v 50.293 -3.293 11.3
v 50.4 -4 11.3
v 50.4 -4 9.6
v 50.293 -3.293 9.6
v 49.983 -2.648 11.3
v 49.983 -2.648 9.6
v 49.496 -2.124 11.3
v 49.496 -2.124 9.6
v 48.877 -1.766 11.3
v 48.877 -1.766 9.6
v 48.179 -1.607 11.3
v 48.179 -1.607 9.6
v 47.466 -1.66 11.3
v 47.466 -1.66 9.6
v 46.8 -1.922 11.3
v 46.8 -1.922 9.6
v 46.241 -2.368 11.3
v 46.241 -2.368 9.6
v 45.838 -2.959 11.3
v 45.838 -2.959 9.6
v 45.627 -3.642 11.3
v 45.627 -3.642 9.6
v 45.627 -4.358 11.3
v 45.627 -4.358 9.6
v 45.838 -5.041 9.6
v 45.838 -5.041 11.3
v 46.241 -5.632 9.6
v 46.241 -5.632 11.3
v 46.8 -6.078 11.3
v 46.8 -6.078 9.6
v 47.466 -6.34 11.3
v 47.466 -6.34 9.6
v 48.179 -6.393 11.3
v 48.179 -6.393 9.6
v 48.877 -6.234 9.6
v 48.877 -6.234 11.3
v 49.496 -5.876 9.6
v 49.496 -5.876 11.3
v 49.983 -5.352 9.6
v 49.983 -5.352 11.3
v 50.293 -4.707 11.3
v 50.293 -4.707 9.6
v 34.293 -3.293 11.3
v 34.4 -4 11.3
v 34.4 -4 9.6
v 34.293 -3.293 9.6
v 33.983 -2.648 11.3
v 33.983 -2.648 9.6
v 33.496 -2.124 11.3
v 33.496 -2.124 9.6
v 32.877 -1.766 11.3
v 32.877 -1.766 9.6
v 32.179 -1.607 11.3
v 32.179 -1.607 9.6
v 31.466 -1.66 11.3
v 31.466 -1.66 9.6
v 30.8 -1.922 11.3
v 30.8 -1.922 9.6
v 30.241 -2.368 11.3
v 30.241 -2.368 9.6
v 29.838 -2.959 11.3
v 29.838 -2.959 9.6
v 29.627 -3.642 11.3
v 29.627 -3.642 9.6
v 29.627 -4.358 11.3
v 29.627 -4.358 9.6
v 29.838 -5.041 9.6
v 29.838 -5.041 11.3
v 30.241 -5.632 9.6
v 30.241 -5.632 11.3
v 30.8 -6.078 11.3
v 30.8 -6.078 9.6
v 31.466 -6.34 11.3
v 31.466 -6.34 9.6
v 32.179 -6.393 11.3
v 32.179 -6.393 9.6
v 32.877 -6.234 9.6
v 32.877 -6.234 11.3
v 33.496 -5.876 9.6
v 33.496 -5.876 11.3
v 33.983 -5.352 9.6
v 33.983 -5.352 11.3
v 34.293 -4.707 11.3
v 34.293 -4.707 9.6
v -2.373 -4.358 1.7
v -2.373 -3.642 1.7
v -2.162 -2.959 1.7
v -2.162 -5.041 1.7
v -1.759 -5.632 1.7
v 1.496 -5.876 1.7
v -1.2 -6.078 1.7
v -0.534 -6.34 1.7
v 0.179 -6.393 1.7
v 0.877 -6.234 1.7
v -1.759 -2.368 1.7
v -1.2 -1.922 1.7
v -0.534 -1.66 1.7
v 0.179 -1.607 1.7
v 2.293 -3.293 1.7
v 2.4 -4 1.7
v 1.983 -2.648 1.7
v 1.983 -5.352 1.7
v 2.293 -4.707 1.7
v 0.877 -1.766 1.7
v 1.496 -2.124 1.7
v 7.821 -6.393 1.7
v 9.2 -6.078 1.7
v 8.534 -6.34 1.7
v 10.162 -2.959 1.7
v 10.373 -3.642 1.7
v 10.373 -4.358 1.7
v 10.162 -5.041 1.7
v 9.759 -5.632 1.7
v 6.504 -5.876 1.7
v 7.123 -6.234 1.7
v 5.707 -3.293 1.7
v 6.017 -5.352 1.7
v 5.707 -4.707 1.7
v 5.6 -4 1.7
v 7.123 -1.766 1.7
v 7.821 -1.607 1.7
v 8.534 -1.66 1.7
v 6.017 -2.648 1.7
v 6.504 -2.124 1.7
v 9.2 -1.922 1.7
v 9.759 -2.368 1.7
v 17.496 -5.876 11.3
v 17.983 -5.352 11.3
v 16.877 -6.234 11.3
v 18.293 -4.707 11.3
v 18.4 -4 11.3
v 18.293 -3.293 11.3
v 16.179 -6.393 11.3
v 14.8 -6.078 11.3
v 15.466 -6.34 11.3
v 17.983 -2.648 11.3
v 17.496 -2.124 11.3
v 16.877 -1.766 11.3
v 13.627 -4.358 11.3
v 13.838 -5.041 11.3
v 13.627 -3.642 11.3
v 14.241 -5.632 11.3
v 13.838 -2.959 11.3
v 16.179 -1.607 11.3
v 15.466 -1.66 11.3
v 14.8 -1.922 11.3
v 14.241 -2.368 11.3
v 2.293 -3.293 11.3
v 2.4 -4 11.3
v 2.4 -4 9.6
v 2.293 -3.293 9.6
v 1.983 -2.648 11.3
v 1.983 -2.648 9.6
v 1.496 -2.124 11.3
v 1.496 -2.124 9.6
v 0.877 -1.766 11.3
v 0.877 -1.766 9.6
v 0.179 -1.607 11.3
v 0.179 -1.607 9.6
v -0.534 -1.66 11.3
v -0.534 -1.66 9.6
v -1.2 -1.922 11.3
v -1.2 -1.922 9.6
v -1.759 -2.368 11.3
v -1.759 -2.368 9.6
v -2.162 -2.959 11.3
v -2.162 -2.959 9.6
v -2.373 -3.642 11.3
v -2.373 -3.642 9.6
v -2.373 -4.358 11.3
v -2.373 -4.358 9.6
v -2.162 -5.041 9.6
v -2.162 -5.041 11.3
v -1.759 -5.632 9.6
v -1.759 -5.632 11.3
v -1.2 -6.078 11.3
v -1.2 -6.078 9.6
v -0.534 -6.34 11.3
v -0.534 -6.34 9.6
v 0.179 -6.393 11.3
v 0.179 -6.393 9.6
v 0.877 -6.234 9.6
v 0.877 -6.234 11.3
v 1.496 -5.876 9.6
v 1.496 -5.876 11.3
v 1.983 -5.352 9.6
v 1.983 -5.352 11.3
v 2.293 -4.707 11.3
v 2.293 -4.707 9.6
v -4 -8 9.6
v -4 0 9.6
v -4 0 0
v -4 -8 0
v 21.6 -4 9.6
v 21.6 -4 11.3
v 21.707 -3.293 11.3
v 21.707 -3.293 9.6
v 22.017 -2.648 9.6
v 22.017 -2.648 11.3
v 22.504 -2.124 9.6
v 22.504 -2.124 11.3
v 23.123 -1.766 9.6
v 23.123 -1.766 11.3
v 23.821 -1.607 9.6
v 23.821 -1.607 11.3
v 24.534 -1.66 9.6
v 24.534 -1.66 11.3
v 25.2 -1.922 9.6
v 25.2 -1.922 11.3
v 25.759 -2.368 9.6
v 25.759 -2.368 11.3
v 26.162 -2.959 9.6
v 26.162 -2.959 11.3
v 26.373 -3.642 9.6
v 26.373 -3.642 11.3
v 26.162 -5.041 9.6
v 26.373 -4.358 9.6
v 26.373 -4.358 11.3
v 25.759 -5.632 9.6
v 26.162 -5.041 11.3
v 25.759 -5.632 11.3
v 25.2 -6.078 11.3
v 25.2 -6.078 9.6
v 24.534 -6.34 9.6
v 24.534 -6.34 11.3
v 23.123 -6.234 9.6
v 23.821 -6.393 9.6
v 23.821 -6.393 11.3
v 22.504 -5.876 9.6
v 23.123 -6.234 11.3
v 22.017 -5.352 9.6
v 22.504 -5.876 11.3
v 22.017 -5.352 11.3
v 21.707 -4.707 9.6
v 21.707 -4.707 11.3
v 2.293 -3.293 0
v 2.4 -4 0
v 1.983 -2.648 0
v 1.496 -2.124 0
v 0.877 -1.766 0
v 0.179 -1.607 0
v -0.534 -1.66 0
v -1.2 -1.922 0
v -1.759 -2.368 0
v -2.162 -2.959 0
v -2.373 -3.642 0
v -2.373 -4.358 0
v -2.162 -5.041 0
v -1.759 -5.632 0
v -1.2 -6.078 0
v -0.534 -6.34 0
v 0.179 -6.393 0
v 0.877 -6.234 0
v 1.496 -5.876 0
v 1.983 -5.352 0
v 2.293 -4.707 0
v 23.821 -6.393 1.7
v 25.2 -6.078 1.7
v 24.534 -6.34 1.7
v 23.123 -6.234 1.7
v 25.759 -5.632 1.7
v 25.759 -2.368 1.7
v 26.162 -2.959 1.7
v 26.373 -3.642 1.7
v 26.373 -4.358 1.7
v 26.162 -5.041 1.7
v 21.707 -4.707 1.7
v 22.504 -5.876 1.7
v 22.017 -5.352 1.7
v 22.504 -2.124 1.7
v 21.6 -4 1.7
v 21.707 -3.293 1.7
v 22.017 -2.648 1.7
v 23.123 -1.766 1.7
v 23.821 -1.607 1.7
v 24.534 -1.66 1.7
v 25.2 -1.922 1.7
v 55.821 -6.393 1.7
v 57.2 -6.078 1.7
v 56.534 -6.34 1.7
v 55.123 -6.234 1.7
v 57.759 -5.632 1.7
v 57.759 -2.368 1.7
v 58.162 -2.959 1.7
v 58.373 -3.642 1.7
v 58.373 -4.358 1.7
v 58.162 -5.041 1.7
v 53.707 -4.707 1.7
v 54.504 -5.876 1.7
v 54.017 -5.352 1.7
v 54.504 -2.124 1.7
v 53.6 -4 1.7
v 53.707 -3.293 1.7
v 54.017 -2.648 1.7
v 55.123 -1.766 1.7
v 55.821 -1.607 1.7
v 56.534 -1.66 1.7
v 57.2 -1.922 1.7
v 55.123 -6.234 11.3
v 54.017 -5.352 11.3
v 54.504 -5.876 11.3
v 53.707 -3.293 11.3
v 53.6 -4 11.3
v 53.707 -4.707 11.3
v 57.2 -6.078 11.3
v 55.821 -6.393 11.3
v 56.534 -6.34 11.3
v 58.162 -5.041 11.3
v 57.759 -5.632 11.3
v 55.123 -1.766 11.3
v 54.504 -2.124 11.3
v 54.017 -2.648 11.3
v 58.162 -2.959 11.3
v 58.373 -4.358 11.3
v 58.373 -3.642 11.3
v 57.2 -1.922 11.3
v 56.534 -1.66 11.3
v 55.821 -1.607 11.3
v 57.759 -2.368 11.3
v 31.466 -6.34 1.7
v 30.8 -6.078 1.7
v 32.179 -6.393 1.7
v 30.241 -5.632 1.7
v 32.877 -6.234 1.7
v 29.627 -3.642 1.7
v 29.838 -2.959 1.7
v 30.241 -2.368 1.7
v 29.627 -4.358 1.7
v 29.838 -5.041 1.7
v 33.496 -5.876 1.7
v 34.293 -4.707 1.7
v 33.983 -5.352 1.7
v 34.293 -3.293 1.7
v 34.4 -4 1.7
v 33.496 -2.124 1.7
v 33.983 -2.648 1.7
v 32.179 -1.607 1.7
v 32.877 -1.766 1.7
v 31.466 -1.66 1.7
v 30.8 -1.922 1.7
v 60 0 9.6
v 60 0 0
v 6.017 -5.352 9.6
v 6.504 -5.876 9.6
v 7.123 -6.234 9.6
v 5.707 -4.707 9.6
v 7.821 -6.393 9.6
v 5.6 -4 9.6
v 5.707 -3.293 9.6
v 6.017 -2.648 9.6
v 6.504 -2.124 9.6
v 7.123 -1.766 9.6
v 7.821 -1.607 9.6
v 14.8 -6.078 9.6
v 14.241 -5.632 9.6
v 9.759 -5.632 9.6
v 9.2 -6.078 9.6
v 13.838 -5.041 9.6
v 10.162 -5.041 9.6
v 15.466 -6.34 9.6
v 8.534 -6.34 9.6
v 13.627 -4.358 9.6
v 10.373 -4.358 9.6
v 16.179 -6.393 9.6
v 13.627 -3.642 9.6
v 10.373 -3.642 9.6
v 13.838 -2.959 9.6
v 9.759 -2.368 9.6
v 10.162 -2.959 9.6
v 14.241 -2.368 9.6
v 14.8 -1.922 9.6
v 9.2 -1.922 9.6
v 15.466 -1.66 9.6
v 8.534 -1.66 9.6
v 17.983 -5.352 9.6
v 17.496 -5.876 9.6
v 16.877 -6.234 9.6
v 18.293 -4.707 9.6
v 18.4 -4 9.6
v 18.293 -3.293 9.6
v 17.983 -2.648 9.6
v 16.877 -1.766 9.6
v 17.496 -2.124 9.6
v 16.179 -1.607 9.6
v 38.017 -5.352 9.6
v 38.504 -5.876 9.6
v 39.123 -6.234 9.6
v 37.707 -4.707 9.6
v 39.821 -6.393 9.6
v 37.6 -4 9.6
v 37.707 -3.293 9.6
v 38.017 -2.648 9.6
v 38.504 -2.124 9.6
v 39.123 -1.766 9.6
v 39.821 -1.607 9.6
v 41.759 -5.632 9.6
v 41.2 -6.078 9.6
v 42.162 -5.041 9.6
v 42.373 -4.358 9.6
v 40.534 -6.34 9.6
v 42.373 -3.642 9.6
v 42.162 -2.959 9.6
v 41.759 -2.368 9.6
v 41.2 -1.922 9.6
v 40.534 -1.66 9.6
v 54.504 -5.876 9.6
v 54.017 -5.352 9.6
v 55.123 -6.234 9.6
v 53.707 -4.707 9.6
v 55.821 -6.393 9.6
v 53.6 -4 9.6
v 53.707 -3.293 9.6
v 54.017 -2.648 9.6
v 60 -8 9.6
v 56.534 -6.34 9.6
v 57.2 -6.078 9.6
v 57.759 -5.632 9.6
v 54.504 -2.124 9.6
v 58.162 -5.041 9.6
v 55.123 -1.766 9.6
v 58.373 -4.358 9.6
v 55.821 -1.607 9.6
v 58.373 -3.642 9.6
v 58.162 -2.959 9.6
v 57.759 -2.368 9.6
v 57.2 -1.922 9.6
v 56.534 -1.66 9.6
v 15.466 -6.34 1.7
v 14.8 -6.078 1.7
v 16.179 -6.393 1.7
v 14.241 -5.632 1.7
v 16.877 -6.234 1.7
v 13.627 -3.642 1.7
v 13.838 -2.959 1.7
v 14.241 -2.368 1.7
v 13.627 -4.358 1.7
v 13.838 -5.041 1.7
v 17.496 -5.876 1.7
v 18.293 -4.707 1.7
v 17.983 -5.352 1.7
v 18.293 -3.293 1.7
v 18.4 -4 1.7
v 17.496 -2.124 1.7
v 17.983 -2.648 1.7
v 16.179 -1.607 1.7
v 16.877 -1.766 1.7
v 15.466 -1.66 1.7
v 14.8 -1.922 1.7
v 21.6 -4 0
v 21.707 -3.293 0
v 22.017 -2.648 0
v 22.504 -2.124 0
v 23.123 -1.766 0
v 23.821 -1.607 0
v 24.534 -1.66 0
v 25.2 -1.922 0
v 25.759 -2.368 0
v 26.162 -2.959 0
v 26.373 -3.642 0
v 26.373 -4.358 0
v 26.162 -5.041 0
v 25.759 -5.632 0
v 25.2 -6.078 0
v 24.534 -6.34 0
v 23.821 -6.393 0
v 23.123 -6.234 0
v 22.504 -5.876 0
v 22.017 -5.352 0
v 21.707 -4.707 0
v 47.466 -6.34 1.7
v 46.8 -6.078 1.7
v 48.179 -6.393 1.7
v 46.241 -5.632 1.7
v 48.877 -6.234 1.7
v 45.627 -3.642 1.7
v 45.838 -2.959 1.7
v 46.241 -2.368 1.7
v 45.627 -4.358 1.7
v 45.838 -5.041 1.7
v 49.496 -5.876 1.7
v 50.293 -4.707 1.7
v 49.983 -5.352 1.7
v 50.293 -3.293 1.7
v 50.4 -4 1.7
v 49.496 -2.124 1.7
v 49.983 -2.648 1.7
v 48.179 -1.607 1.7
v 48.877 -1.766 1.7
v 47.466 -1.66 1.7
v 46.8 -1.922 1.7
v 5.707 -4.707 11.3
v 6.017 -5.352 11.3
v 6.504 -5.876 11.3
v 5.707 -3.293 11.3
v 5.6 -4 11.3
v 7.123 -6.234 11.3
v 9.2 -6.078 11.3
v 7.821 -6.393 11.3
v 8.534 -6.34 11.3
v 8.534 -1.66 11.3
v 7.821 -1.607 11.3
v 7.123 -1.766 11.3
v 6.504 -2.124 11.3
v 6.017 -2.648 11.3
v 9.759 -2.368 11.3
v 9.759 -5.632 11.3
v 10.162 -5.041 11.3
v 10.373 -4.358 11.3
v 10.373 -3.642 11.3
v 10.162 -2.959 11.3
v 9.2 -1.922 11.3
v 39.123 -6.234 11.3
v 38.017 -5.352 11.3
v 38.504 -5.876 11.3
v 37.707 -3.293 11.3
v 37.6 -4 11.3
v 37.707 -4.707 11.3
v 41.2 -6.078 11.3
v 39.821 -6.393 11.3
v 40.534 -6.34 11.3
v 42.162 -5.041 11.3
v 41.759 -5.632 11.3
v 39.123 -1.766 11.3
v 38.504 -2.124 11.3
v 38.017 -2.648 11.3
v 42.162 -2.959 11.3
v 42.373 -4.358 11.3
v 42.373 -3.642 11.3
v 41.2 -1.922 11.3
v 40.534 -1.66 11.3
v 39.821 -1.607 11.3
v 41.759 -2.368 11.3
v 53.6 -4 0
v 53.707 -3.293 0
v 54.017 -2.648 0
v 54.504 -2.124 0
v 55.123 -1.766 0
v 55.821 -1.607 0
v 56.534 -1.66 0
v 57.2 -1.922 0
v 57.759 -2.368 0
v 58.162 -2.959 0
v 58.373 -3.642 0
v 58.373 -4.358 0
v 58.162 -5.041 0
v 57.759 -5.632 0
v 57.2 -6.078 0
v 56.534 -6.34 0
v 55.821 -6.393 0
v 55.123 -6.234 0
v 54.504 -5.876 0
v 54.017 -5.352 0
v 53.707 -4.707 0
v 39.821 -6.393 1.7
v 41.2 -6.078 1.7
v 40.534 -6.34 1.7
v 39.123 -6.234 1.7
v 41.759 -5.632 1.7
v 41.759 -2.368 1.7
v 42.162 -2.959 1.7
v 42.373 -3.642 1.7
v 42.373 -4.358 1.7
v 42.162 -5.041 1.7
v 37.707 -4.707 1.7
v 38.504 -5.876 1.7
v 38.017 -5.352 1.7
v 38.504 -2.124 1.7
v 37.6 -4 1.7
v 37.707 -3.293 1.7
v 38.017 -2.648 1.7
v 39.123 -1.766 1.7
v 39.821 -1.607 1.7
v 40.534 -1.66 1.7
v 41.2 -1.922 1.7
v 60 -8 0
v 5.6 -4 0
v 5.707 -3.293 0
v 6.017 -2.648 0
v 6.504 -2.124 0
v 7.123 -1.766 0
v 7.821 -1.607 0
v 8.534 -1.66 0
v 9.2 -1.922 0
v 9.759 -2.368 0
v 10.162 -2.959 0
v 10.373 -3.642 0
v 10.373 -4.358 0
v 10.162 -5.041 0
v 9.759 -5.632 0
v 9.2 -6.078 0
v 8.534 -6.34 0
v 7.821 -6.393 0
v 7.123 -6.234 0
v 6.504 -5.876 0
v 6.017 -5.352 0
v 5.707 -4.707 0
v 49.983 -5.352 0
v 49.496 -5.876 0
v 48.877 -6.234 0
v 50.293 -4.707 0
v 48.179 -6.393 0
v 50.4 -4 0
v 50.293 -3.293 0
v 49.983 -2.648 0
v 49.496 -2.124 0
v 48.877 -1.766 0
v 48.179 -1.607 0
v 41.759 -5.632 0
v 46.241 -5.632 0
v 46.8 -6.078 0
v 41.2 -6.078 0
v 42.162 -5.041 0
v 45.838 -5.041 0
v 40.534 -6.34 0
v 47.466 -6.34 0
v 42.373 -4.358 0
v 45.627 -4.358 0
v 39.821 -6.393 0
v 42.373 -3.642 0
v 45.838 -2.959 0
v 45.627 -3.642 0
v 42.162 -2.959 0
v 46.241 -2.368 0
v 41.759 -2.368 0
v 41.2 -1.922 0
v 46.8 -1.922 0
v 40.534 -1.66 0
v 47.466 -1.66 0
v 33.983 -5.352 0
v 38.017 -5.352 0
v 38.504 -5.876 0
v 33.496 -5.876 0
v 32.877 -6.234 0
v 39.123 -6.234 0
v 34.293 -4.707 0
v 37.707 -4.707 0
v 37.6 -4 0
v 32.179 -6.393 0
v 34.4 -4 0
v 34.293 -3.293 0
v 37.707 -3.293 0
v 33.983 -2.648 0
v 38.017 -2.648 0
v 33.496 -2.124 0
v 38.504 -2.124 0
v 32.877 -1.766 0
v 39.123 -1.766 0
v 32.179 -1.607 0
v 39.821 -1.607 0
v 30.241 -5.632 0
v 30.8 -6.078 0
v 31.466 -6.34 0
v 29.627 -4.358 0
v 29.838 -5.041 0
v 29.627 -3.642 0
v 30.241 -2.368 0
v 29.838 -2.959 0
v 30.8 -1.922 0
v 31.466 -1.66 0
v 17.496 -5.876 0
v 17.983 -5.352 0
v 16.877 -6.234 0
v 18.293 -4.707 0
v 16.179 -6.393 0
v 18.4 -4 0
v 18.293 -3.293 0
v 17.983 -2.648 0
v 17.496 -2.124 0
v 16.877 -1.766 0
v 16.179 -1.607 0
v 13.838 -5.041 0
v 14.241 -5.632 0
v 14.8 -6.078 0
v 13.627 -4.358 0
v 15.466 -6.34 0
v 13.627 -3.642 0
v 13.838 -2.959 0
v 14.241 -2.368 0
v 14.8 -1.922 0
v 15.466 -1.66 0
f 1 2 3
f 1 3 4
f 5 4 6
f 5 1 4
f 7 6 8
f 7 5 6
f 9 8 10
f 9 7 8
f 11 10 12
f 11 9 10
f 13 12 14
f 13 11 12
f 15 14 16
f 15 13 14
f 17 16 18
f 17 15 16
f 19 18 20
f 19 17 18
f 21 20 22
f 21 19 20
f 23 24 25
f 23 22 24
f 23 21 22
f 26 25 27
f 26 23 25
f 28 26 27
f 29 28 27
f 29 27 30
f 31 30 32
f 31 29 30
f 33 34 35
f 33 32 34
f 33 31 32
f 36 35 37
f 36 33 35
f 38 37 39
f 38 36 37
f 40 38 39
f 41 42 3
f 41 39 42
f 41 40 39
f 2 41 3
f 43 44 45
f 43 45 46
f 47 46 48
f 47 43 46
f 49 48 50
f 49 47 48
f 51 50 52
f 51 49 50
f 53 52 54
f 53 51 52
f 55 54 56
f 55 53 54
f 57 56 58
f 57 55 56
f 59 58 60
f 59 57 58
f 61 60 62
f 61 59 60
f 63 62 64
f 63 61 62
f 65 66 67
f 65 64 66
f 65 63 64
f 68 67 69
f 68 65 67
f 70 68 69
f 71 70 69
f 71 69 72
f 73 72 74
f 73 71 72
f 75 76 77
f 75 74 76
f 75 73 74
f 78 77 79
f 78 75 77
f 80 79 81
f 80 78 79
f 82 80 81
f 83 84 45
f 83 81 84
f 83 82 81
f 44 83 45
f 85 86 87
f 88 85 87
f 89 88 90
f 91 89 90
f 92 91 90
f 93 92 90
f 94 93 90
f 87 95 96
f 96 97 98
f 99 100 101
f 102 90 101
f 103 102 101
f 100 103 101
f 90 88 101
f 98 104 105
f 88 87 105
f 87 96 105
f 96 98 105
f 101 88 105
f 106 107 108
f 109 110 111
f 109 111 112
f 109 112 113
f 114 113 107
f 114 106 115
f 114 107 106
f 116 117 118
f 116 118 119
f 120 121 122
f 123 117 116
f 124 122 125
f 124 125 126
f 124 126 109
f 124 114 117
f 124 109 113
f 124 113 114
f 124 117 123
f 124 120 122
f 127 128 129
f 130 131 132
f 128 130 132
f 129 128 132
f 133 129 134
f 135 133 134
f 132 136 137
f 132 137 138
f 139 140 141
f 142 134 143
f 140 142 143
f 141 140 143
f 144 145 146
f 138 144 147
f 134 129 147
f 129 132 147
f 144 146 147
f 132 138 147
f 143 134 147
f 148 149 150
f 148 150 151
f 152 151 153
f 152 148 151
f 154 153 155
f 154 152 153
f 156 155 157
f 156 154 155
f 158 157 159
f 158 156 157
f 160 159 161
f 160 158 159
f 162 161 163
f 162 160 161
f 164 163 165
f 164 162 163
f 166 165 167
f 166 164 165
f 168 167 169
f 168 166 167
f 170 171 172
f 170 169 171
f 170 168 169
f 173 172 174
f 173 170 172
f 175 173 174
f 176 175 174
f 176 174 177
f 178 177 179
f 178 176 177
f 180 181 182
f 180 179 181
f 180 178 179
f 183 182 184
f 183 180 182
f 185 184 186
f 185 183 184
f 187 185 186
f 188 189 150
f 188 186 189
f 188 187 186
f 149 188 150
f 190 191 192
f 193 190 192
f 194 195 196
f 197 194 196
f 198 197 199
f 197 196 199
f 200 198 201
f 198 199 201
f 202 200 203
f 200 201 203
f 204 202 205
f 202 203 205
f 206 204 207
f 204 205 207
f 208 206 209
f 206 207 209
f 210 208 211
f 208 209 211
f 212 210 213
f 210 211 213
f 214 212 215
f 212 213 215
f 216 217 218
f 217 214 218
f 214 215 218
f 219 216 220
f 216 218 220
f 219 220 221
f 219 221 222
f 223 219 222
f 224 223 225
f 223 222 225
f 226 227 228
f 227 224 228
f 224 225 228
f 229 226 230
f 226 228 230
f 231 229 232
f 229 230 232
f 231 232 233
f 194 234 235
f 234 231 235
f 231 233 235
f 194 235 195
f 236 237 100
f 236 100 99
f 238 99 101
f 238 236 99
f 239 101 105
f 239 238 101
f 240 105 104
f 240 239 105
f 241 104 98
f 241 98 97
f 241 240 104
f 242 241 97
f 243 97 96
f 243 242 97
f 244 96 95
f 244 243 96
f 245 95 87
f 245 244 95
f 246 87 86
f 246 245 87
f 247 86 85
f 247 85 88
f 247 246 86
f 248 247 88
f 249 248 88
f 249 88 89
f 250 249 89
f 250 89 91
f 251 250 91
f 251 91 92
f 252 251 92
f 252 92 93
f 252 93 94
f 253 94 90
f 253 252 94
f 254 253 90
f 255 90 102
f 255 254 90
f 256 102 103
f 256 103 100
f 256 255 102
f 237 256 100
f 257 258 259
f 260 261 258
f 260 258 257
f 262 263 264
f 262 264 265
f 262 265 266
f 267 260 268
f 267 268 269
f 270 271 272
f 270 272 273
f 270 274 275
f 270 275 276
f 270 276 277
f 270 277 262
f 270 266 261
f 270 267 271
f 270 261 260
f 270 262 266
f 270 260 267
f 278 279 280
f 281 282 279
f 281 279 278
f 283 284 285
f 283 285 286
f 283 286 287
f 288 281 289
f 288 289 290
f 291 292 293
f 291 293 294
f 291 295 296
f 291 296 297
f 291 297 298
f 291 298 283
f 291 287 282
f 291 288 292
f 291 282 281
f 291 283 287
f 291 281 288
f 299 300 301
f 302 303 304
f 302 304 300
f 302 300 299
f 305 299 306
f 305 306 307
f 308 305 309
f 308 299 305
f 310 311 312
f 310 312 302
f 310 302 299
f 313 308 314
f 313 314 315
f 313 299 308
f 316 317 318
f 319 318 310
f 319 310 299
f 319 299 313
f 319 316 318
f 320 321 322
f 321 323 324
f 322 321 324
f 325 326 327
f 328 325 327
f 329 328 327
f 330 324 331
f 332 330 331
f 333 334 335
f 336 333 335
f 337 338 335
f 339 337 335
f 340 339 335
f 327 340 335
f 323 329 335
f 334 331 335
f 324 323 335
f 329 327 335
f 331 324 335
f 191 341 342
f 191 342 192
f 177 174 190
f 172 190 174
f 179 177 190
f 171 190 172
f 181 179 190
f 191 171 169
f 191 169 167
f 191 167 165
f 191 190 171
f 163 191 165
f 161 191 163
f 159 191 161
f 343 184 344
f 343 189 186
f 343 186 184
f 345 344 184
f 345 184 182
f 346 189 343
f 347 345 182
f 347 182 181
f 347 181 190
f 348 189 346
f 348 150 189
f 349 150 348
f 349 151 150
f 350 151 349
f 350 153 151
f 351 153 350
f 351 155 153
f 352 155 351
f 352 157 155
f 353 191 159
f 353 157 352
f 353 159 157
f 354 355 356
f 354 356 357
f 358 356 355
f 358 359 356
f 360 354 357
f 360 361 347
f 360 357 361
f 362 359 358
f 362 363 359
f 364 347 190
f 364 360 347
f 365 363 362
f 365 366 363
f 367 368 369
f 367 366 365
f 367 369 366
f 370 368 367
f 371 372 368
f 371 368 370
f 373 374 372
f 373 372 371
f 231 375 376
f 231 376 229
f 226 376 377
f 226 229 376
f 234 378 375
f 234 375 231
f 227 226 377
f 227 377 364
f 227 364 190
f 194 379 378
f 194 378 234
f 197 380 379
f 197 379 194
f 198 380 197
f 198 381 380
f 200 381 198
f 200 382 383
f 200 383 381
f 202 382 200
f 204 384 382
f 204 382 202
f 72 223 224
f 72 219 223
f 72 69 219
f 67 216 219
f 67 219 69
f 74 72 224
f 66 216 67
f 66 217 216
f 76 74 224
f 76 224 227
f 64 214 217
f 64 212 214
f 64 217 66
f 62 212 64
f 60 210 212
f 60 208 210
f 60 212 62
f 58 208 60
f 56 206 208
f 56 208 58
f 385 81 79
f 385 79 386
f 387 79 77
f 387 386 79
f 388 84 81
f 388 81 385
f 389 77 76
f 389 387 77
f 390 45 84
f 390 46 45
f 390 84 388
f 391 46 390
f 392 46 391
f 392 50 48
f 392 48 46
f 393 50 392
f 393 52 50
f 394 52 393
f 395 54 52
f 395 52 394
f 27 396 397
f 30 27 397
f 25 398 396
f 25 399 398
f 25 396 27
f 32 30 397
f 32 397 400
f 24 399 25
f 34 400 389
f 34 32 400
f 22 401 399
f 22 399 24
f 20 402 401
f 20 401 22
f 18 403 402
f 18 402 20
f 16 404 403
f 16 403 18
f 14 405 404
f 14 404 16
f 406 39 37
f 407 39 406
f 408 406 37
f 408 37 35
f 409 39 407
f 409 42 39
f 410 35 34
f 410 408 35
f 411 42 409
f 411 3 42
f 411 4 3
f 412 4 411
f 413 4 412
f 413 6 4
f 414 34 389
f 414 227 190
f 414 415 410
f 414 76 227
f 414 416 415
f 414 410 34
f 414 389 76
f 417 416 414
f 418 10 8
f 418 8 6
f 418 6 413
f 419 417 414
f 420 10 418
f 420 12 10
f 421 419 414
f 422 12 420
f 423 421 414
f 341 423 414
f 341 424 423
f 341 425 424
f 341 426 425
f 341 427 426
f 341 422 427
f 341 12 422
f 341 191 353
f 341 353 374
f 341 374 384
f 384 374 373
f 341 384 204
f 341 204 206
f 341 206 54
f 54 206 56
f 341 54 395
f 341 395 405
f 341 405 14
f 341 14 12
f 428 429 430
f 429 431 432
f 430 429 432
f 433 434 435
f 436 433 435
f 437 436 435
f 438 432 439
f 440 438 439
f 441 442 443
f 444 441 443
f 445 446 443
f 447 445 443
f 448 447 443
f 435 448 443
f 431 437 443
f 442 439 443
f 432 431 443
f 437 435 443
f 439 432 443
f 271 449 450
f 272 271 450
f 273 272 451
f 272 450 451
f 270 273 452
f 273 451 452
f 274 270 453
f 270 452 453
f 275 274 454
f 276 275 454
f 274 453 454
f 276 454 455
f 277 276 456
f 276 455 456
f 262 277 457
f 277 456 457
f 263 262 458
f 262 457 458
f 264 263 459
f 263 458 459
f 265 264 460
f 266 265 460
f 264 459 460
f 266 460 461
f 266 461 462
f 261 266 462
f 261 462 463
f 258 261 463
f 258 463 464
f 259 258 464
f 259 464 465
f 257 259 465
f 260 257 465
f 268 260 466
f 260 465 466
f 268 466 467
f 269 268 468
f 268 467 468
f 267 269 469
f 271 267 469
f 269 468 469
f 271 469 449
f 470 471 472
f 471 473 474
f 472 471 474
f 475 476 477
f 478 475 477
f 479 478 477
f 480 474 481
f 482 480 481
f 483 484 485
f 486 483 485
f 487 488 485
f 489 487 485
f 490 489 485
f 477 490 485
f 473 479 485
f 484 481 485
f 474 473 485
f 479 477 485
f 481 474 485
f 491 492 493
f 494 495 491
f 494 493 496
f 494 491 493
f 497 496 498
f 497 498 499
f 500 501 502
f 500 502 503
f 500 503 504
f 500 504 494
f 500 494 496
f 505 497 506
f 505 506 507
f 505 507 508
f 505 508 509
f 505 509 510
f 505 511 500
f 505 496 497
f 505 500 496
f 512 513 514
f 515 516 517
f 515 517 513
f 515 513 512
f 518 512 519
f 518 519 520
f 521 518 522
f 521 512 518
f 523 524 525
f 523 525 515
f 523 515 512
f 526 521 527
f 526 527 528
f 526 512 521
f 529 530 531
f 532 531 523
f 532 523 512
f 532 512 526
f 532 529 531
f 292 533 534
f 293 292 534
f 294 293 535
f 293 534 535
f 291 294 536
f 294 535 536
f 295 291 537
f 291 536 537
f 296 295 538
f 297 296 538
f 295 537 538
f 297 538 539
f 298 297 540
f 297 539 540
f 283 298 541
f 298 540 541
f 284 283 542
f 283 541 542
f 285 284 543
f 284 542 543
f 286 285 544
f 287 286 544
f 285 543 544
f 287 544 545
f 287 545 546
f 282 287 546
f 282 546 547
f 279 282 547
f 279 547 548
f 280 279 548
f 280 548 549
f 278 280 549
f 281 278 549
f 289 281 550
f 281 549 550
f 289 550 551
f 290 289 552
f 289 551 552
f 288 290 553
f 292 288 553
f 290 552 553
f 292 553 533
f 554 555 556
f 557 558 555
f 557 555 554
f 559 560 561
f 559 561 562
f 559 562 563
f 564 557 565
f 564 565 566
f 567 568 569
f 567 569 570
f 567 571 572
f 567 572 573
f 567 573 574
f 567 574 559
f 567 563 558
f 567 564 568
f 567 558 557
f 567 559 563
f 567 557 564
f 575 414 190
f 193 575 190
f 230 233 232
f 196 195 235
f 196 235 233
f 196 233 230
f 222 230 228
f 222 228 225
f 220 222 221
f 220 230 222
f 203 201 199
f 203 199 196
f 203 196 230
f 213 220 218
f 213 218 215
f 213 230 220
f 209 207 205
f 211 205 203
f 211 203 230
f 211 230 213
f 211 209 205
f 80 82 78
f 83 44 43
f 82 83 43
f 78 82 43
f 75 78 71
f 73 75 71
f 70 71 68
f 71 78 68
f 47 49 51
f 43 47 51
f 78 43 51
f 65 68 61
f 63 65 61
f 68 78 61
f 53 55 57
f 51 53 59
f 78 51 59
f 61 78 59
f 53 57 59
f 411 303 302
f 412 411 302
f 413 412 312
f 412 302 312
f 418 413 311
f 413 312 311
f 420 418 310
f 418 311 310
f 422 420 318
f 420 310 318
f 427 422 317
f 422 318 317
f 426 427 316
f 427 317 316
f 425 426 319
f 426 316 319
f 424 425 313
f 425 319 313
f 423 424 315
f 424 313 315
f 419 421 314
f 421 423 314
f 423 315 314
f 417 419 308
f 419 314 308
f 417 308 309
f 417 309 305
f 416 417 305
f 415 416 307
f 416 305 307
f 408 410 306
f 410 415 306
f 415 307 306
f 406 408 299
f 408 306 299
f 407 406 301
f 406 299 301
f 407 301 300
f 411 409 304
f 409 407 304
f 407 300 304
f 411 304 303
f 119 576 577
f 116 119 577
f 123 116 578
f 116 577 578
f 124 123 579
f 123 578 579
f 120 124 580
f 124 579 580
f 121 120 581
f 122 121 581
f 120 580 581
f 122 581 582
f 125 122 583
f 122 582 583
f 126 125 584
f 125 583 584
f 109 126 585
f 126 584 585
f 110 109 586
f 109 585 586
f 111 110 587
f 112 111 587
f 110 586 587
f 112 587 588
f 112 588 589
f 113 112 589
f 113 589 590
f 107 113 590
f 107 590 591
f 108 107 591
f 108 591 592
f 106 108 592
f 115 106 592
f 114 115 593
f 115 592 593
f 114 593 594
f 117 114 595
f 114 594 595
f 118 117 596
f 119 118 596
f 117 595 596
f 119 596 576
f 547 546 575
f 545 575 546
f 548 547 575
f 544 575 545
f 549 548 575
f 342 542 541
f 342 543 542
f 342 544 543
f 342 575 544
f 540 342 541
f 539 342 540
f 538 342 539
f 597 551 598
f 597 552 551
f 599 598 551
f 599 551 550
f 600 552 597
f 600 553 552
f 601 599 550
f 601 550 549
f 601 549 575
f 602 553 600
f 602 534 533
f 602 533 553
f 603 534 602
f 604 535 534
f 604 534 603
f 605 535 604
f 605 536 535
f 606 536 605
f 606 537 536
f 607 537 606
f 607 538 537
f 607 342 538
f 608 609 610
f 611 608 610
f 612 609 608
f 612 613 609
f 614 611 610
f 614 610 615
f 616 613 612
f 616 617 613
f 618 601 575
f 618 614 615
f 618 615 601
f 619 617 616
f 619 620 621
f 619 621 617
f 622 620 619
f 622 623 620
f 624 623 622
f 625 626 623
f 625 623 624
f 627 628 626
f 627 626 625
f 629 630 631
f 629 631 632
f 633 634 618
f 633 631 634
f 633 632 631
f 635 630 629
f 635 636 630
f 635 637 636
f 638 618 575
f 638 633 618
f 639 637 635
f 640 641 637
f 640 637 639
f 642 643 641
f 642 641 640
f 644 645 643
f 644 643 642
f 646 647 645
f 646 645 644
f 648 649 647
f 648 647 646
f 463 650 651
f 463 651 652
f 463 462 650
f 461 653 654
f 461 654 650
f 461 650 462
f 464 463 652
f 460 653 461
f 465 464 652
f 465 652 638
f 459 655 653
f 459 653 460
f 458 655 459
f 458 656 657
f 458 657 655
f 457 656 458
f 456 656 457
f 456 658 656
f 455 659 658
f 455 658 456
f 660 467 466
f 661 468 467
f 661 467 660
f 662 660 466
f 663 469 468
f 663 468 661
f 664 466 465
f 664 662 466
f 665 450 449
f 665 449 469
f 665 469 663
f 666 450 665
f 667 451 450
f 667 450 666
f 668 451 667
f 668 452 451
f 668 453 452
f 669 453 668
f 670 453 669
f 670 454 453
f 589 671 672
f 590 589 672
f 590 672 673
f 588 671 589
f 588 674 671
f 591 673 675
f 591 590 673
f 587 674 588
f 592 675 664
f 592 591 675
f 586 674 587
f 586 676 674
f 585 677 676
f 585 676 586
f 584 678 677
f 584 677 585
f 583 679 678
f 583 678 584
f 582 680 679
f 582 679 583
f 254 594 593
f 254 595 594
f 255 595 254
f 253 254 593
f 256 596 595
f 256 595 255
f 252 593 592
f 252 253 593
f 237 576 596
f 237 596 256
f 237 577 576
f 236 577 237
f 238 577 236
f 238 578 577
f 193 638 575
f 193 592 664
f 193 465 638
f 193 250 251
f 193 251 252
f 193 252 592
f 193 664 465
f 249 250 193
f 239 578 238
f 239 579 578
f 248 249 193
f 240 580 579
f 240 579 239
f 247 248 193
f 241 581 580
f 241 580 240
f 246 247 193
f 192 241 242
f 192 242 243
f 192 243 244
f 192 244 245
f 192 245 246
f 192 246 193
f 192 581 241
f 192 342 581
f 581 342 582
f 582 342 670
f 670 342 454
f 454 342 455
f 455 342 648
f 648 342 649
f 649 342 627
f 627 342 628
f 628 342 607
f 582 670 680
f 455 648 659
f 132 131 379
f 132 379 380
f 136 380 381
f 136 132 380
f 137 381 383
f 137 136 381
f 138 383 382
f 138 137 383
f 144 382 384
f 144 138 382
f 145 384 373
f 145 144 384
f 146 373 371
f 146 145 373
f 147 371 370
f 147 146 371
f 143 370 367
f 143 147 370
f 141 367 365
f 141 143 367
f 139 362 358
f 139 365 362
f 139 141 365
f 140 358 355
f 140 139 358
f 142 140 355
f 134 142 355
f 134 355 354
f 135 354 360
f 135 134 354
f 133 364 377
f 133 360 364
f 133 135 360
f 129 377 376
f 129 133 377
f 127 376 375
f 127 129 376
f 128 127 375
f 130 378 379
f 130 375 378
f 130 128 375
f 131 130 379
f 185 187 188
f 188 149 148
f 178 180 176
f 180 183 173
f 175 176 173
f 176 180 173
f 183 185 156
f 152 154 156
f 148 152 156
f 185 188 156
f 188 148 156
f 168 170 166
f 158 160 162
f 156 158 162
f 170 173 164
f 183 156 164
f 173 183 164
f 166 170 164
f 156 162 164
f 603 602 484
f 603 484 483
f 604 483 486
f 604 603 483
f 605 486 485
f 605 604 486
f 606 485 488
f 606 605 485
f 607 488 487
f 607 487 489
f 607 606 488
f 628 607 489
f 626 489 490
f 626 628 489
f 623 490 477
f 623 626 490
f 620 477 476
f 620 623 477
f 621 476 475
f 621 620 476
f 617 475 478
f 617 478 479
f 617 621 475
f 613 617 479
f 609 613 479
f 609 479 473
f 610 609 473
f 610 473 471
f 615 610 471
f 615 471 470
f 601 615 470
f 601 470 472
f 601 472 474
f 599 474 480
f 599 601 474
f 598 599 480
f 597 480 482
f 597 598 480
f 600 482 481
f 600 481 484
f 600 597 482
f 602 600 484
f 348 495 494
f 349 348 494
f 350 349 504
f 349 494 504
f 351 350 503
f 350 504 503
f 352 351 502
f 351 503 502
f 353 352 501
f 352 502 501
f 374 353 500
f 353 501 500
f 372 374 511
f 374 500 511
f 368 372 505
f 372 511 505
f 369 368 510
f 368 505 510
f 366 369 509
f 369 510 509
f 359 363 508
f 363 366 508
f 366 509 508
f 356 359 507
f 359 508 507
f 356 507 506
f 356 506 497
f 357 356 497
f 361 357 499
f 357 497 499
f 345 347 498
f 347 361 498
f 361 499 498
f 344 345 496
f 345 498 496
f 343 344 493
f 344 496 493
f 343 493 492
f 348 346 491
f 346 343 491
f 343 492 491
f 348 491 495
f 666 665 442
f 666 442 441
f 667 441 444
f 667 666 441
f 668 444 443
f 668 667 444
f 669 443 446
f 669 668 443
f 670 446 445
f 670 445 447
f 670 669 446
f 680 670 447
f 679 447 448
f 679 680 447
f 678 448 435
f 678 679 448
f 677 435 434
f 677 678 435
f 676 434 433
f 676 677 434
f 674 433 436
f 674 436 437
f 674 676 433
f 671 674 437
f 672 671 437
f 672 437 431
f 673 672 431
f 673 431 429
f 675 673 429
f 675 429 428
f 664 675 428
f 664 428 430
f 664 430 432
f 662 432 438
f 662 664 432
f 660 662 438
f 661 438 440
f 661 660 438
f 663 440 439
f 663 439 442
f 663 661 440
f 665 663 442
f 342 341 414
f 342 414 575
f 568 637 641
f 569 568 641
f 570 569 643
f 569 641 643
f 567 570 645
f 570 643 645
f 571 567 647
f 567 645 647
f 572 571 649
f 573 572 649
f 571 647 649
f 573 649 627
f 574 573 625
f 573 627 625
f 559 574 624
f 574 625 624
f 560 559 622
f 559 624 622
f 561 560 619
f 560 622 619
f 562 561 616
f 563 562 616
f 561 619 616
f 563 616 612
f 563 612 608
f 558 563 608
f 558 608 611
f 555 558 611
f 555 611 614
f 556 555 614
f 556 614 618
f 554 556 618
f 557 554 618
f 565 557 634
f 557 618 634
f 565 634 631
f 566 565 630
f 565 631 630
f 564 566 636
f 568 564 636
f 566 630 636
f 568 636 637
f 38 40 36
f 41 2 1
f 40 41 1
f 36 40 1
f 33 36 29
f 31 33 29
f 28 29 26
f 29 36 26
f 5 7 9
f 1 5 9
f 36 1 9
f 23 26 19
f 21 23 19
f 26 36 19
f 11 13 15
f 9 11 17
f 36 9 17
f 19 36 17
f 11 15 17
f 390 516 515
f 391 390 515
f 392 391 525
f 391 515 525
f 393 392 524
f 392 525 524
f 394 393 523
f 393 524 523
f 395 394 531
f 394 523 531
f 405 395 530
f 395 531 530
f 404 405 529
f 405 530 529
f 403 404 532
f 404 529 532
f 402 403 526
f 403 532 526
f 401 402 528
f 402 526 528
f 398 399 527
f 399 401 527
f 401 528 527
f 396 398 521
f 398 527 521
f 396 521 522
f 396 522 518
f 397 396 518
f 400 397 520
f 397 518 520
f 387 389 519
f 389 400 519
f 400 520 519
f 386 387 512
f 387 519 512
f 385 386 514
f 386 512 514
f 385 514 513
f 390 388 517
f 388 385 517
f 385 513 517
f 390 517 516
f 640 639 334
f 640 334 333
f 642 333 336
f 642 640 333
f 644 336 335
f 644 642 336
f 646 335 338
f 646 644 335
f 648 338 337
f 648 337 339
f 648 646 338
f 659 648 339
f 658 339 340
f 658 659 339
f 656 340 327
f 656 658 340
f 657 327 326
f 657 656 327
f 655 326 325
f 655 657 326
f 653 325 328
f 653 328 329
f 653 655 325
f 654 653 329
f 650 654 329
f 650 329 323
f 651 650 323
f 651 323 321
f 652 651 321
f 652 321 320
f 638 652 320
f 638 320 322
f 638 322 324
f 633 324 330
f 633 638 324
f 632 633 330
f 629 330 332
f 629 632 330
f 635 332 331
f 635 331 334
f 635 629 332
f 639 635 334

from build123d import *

# Parameters (mm, degrees)
F1_DEPTH = 8
F3_W     = 8
F3_H     = 8
F3_R     = 2.4
F4_DEPTH = 1.7
F5_R     = 2.4
F6_DEPTH = 1.7


with BuildPart() as f1:
    # F0 (on Front) → F1 (new body)
    with BuildSketch(Plane.XZ):
        Polygon((-2.4, 9.6), (-4, 9.6), (-4, 0), (4, 0), (4, 9.6), (2.4, 9.6), (2.4, 11.3), (-2.4, 11.3), align=None)
    extrude(amount=F1_DEPTH)

    # F3 (on plane+point) → F4 (cut, through all)
    with BuildSketch(Plane.XY.offset(11.3)):
        with Locations((0, -4)):
            Rectangle(F3_W, F3_H)
        with Locations((0, -4)):
            Circle(F3_R, mode=Mode.SUBTRACT)
    extrude(amount=-F4_DEPTH, mode=Mode.SUBTRACT)

    # F5 (on Top) → F6 (cut)
    with BuildSketch(Plane.XY):
        with Locations((0, -4)):
            Circle(F5_R)
    extrude(amount=F6_DEPTH, mode=Mode.SUBTRACT)

    # F8: F1 across plane


with BuildPart() as f1_1:
    add(f1.part)
    add(f1.part.mirror(Plane.YZ.offset(4)))

    # F10: F1 across plane


with BuildPart() as f1_2:
    add(f1_1.part)
    add(f1_1.part.mirror(Plane.YZ.offset(12)))

    # F12: F1 across plane


with BuildPart() as f1_3:
    add(f1_2.part)
    add(f1_2.part.mirror(Plane.YZ.offset(28)))


solid = f1_3.part
